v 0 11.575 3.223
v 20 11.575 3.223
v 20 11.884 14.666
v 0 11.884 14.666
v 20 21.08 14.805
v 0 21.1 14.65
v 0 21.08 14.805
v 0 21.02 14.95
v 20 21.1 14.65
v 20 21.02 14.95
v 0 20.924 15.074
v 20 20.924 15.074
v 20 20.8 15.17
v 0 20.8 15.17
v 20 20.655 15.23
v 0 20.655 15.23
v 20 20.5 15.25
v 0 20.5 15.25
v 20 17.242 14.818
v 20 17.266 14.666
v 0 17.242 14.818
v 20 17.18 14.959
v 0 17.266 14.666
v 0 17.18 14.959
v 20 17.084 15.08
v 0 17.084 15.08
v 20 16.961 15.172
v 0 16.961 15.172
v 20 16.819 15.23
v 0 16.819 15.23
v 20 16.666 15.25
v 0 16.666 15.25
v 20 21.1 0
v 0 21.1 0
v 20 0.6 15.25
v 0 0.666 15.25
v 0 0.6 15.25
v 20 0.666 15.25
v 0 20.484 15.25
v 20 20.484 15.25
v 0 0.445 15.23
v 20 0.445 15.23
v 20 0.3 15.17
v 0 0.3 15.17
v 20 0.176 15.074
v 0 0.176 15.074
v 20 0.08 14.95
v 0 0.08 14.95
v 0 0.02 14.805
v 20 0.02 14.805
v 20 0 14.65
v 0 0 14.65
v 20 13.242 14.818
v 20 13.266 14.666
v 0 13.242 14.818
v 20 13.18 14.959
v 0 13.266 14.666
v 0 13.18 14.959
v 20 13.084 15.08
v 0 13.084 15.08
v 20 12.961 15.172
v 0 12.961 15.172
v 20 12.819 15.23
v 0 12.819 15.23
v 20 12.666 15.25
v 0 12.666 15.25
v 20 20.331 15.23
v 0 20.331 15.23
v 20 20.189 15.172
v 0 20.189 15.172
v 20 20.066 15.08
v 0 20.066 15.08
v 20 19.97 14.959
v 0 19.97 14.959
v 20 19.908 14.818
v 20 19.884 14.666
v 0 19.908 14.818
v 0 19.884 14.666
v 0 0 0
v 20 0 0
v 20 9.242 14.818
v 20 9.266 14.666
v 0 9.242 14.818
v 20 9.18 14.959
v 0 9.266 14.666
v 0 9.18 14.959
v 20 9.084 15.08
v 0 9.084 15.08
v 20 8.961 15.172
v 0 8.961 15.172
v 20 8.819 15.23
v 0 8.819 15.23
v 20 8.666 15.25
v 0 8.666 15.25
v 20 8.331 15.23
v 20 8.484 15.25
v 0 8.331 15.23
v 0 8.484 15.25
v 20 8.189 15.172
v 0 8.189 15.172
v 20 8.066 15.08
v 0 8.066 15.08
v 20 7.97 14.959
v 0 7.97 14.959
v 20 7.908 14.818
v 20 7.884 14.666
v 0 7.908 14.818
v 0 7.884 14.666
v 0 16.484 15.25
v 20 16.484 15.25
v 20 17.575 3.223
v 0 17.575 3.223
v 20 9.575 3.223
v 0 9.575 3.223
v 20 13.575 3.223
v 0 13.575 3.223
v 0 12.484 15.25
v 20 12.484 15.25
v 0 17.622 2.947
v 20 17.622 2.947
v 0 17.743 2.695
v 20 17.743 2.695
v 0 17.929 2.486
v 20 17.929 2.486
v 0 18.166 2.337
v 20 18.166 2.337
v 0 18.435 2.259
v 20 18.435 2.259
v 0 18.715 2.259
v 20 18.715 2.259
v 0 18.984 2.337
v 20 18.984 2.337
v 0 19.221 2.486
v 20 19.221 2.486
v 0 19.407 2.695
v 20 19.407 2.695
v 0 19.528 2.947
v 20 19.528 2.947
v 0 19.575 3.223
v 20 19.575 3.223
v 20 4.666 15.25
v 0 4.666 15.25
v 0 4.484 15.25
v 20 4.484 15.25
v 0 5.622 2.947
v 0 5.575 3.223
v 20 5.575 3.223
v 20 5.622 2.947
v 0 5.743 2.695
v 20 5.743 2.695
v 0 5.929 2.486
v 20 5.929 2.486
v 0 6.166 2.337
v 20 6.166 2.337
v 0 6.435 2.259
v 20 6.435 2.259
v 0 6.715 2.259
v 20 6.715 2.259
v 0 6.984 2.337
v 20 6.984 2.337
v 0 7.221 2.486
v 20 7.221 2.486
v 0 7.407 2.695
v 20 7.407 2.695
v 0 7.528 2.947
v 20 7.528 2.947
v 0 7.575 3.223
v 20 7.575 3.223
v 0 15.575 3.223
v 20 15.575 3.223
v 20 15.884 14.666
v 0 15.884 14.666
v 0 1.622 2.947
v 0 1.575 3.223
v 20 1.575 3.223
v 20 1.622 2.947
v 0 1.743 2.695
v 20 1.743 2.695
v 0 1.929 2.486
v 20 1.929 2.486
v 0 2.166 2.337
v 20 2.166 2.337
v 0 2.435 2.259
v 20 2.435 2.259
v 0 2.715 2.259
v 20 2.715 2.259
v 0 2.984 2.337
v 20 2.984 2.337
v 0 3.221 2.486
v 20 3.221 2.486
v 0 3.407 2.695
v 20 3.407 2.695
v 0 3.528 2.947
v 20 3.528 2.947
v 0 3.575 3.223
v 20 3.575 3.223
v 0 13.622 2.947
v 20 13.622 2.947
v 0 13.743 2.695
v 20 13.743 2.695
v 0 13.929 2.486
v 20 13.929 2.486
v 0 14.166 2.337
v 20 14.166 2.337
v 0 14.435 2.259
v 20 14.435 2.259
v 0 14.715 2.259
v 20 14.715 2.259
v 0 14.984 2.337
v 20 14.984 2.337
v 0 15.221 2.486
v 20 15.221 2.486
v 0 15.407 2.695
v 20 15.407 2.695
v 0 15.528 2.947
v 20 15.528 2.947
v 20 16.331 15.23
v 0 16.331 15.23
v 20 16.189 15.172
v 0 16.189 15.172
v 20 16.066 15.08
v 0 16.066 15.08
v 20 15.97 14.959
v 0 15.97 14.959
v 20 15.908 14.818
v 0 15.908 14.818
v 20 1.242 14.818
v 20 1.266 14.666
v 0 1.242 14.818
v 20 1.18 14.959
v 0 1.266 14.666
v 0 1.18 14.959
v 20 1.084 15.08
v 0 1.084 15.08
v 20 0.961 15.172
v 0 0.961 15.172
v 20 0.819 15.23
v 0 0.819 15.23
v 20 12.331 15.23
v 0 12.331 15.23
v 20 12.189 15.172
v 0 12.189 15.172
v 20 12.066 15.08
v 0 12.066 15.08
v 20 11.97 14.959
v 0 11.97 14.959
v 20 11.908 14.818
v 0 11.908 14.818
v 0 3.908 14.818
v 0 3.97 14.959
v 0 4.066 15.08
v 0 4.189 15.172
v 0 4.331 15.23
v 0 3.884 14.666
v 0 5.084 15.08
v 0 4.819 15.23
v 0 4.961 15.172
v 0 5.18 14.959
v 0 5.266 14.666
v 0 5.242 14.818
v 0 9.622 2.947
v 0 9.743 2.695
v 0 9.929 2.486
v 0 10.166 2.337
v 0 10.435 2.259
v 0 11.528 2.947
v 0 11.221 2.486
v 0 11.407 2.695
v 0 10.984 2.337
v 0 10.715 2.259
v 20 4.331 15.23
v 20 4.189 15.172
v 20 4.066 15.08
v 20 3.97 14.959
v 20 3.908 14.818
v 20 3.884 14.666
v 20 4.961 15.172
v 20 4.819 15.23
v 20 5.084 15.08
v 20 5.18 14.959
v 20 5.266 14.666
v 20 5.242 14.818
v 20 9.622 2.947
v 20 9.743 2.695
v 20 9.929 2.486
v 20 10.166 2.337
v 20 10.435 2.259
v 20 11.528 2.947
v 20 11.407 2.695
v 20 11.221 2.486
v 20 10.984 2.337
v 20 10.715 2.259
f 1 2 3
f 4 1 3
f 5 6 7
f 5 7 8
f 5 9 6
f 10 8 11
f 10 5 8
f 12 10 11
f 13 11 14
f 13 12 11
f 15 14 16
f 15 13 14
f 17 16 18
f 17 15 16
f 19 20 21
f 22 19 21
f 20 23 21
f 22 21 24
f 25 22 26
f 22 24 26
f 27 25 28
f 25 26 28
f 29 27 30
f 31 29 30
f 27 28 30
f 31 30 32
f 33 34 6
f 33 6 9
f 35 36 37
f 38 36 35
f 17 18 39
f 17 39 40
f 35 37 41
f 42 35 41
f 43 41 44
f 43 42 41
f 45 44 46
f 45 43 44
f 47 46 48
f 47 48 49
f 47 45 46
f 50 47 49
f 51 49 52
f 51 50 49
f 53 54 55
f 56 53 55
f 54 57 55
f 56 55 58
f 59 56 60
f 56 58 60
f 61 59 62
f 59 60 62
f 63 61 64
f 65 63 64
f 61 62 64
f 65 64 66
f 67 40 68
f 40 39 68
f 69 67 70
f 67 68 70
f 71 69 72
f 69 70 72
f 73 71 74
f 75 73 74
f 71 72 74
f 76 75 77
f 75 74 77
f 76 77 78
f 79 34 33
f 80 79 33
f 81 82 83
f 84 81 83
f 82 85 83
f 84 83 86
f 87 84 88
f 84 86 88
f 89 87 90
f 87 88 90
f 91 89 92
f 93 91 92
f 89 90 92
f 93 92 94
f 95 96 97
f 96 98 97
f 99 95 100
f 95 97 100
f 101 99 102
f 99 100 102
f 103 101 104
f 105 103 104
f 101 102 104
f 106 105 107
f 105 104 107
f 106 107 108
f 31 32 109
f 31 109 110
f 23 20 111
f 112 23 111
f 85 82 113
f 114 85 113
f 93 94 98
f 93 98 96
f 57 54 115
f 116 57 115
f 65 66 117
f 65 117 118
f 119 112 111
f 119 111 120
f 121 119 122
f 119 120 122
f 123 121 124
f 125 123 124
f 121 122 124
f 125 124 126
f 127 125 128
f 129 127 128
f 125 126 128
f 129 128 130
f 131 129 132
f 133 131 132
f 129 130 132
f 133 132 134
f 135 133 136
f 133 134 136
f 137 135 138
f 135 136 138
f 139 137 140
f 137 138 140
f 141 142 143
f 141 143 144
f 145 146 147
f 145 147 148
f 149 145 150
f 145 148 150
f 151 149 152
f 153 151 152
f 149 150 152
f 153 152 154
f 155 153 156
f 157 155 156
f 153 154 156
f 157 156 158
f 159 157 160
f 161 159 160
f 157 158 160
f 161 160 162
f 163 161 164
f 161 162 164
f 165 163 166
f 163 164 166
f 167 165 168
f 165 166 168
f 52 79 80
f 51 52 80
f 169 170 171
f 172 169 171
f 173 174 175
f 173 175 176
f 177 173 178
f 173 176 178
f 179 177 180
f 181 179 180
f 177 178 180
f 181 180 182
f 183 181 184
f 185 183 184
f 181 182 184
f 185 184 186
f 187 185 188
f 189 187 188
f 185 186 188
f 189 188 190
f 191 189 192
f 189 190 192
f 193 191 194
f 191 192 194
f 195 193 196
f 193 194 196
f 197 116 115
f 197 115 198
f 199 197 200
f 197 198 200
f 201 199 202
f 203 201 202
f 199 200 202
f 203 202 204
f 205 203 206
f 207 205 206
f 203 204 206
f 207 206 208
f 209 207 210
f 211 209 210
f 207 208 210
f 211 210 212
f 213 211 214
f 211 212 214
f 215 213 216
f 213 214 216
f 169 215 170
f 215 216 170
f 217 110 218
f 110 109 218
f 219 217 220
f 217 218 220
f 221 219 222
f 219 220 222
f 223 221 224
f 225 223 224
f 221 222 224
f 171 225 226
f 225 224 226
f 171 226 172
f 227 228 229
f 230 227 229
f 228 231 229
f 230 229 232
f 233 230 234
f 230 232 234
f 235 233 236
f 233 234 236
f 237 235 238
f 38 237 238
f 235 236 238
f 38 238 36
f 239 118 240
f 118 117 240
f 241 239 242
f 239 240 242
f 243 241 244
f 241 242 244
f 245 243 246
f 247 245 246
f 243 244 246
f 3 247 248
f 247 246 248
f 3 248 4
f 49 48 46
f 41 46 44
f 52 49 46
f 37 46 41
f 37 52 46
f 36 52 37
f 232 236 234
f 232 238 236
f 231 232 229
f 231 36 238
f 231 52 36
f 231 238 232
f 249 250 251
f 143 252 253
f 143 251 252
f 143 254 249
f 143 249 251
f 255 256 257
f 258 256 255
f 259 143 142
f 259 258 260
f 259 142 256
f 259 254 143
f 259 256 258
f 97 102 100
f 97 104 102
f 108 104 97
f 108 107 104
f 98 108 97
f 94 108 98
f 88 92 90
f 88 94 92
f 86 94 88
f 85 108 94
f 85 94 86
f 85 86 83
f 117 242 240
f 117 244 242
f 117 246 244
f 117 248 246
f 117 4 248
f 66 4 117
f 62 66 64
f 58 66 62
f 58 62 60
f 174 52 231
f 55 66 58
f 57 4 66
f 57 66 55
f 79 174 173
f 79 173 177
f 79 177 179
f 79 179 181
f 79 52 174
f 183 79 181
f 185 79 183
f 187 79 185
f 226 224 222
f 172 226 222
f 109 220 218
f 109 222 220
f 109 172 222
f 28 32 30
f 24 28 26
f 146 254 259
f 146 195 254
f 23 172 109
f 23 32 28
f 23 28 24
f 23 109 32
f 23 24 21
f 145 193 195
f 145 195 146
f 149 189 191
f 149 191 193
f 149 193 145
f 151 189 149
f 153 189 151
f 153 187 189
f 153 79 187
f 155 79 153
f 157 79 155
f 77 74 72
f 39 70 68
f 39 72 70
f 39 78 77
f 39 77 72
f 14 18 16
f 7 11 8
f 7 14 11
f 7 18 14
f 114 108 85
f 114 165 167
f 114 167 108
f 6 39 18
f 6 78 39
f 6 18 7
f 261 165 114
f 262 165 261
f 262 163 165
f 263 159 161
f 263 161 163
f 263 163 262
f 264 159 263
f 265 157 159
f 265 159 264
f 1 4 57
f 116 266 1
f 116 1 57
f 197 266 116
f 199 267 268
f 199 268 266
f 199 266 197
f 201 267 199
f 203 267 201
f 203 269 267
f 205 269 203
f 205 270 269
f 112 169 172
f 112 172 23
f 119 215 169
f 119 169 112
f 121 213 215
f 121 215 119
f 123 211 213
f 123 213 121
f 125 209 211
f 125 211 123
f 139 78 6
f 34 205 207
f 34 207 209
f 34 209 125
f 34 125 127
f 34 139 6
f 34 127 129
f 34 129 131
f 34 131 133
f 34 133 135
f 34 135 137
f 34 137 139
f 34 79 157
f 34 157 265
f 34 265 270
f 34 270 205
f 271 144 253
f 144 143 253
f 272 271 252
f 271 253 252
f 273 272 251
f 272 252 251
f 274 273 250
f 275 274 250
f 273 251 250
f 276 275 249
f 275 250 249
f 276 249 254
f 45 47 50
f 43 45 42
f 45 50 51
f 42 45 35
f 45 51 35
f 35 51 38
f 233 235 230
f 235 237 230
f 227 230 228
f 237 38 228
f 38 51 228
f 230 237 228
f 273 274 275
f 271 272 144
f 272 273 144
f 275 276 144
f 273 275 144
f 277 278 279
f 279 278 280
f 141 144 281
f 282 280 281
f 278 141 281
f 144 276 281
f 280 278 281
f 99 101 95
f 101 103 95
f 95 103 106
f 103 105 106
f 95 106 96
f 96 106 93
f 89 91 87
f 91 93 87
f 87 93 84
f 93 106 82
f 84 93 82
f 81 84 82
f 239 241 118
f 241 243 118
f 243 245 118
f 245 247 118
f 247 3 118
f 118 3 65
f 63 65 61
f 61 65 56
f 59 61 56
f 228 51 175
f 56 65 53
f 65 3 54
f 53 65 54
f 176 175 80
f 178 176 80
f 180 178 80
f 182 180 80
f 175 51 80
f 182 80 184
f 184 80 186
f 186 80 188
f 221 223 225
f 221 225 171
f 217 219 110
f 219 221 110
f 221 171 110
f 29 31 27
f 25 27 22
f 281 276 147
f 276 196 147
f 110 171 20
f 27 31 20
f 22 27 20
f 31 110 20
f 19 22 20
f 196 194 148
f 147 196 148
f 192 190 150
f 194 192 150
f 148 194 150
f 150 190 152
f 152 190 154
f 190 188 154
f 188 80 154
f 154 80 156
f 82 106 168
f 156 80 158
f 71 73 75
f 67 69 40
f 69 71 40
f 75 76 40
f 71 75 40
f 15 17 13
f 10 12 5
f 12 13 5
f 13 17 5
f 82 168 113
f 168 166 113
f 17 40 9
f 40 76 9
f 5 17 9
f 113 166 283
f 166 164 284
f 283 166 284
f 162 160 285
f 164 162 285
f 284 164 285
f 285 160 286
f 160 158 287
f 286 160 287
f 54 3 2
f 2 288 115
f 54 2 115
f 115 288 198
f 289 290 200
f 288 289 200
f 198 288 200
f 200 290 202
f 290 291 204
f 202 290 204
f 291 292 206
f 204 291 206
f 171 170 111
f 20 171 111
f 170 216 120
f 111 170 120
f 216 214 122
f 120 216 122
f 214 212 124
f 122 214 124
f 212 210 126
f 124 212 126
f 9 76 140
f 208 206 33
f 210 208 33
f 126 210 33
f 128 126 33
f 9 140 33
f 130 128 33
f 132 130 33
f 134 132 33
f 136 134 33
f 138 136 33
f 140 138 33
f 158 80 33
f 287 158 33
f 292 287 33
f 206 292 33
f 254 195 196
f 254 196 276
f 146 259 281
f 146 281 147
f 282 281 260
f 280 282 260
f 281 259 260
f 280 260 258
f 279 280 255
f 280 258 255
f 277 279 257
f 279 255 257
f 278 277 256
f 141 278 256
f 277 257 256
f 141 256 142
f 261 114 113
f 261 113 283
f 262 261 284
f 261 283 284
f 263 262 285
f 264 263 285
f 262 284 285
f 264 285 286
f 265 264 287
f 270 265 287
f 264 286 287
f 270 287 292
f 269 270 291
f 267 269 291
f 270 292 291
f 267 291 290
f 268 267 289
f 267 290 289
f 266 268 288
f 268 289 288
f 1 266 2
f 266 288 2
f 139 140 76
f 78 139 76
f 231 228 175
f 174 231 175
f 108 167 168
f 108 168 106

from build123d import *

# Parameters (mm, degrees)
F0_W     = 20
F0_H     = 21.1
F1_DEPTH = 15.25
F4_DEPTH = 20.001
F5_R     = 0.6


with BuildPart() as f1:
    # F0 (on Top) → F1 (new body)
    with BuildSketch(Plane.XY):
        with Locations((10, 10.55)):
            Rectangle(F0_W, F0_H)
    extrude(amount=F1_DEPTH)

    # F3 (on face) → F4 (cut, through all)
    with BuildSketch(Plane.YZ.offset(20)):
        with BuildLine():
            Line((3.9, 15.25), (1.25, 15.25))
            Line((1.25, 15.25), (1.575, 3.2229775179))
            ThreePointArc((1.575, 3.2229775179), (2.575, 2.2496349594), (3.575, 3.2229775179))
            Line((3.575, 3.2229775179), (3.9, 15.25))
        make_face()
        with BuildLine():
            Line((7.9, 15.25), (5.25, 15.25))
            Line((5.25, 15.25), (5.575, 3.2229775179))
            ThreePointArc((5.575, 3.2229775179), (6.575, 2.2496349594), (7.575, 3.2229775179))
            Line((7.575, 3.2229775179), (7.9, 15.25))
        make_face()
        with BuildLine():
            Line((11.9, 15.25), (9.25, 15.25))
            Line((9.25, 15.25), (9.575, 3.2229775179))
            ThreePointArc((9.575, 3.2229775179), (10.575, 2.2496349594), (11.575, 3.2229775179))
            Line((11.575, 3.2229775179), (11.9, 15.25))
        make_face()
        with BuildLine():
            Line((15.9, 15.25), (13.25, 15.25))
            Line((13.25, 15.25), (13.575, 3.2229775179))
            ThreePointArc((13.575, 3.2229775179), (14.575, 2.2496349594), (15.575, 3.2229775179))
            Line((15.575, 3.2229775179), (15.9, 15.25))
        make_face()
        with BuildLine():
            Line((19.575, 3.2229775179), (19.9, 15.25))
            Line((19.9, 15.25), (17.25, 15.25))
            Line((17.25, 15.25), (17.575, 3.2229775179))
            ThreePointArc((17.575, 3.2229775179), (18.575, 2.2496349594), (19.575, 3.2229775179))
        make_face()
    extrude(amount=-F4_DEPTH, mode=Mode.SUBTRACT)

    # F5
    f5_edges = [f1.edges().sort_by_distance(p)[0] for p in [
        (10, 0, 15.25),
        (10, 1.25, 15.25),
        (10, 3.9, 15.25),
        (10, 5.25, 15.25),
        (10, 7.9, 15.25),
        (10, 9.25, 15.25),
        (10, 11.9, 15.25),
        (10, 13.25, 15.25),
        (10, 15.9, 15.25),
        (10, 17.25, 15.25),
        (10, 19.9, 15.25),
        (10, 21.1, 15.25),
    ]]
    fillet(f5_edges, radius=F5_R)


solid = f1.part
